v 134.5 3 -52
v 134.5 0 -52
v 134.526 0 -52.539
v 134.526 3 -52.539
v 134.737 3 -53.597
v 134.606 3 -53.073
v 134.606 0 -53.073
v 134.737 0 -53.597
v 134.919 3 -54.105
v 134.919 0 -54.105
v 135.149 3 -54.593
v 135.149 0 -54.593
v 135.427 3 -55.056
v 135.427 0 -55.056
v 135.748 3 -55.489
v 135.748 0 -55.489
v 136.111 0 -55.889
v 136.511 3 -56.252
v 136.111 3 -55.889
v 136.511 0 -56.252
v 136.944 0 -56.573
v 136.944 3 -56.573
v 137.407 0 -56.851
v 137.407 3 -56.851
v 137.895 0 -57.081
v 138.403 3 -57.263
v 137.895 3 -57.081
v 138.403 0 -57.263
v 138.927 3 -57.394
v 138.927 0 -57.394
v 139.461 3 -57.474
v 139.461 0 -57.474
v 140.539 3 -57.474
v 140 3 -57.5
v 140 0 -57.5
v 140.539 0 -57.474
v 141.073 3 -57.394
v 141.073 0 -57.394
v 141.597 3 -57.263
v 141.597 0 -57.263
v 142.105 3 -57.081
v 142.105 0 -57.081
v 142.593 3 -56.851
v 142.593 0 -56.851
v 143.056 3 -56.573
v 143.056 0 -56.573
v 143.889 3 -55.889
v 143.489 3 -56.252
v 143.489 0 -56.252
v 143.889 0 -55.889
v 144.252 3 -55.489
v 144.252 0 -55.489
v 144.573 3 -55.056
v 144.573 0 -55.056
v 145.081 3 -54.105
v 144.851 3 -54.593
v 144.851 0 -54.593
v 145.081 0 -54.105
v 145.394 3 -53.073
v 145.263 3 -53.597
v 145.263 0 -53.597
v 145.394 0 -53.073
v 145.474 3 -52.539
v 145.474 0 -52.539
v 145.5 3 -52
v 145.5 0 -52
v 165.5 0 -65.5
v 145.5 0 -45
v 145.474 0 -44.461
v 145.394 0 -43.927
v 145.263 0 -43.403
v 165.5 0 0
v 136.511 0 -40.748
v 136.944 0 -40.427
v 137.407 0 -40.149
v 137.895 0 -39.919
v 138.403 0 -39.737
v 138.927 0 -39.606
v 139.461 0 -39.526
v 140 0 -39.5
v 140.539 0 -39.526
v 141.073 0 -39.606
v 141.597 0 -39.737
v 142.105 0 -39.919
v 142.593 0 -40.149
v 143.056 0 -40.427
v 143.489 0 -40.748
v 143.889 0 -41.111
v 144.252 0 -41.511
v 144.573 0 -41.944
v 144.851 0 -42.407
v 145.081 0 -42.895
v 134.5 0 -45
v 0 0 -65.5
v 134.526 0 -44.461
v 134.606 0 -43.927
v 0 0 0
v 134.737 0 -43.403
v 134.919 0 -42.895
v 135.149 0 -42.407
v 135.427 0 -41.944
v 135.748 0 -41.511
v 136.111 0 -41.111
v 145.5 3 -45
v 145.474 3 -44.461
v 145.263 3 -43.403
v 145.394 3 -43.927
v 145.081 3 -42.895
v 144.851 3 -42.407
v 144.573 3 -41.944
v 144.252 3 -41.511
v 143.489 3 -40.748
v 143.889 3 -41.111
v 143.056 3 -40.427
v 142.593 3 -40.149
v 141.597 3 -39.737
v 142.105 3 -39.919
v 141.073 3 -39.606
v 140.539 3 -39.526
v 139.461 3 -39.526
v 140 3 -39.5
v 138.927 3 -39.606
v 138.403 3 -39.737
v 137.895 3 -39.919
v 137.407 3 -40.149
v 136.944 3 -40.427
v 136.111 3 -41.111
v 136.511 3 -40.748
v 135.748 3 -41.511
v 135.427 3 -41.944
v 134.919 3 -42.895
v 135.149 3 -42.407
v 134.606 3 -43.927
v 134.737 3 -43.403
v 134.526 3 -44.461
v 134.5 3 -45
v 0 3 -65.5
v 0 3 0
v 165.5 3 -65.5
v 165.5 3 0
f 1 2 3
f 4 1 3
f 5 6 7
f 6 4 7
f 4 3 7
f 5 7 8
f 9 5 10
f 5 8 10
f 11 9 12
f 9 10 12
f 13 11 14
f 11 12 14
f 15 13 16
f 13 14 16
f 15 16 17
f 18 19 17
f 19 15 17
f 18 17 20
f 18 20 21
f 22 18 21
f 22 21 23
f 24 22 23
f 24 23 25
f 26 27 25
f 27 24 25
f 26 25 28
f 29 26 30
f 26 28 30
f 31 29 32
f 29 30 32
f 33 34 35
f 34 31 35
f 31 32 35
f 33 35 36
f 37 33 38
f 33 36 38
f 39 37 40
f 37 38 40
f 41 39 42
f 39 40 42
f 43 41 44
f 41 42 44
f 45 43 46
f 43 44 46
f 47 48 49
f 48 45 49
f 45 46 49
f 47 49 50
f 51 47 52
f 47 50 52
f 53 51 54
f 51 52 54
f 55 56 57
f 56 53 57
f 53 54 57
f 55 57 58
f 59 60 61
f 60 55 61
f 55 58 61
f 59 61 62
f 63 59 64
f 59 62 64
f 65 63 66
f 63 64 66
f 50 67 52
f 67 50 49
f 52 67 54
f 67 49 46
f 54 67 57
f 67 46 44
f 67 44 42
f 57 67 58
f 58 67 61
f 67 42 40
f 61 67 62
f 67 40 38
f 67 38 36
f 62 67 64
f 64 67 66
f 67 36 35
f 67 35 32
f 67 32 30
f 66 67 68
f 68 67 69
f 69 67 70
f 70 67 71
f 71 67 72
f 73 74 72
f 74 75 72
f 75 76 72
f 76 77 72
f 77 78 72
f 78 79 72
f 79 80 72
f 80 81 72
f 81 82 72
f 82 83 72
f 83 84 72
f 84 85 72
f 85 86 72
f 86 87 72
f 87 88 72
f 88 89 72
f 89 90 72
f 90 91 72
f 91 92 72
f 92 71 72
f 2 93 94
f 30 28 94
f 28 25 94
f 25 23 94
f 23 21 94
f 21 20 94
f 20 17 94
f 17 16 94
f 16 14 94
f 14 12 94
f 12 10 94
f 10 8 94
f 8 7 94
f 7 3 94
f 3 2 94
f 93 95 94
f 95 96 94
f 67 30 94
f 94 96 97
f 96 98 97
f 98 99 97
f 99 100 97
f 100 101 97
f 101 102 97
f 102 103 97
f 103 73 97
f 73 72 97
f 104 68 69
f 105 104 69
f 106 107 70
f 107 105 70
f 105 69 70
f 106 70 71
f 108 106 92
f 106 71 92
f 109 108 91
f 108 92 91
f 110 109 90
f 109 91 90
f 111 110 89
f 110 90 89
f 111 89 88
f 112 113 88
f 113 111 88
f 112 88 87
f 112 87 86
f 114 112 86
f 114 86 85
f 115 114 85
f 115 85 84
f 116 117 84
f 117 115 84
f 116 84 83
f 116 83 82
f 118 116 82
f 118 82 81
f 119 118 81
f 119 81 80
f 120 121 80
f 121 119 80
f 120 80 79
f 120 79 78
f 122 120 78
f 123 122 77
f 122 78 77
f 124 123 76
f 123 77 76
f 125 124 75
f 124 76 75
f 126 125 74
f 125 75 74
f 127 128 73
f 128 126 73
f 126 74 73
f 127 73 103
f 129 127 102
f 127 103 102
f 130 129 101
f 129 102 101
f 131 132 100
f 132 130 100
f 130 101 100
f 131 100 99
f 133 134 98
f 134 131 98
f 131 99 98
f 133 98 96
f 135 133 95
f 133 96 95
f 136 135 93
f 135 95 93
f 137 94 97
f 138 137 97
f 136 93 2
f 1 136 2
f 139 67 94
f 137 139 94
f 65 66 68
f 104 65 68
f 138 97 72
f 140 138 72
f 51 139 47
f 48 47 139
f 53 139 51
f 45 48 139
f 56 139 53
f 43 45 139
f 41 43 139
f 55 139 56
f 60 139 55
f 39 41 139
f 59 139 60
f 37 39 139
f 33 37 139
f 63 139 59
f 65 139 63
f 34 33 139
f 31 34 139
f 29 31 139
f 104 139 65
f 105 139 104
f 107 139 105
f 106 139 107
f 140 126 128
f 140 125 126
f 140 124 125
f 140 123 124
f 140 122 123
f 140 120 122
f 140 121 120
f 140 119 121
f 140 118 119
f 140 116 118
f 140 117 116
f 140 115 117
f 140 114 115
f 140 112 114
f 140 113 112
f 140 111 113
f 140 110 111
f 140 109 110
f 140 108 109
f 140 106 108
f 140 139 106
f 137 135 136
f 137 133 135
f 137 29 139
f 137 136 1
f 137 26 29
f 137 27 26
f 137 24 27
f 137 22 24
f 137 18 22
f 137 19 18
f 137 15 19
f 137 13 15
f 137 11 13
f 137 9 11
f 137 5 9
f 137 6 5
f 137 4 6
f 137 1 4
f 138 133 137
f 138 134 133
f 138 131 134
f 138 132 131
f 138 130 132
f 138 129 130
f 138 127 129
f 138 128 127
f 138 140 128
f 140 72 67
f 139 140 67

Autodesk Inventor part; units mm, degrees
ref_plane "YZ Plane" through (0, 0, 0) normal (1, 0, 0) x (0, 1, 0)
ref_plane "XZ Plane" through (0, 0, 0) normal (0, 1, 0) x (-1, 0, 0)
ref_plane "XY Plane" through (0, 0, 0) normal (0, 0, 1) x (1, 0, 0)
sketch "Skizze1" plane through (0, 0, 0) normal (0, 1, 0) x (-1, 0, 0)
  line L0 (0, 0) -> (-165.5, 0)
  line L1 (-165.5, 0) -> (-165.5, -65.5)
  line L2 (-165.5, -65.5) -> (0, -65.5)
  line L3 (0, -65.5) -> (0, 0)
  line L4 (-134.5, -45) -> (-134.5, -52)
  line L5 (-145.5, -52) -> (-145.5, -45)
  arc A0 (-145.5, -52) -> (-134.5, -52) centre (-140, -52) ccw
  arc A1 (-134.5, -45) -> (-145.5, -45) centre (-140, -45) ccw
  dimension "d0" = 165.5
  dimension "d1" = 65.5
  dimension "d8" = 11
  dimension "d9" = 7
  dimension "d10" = 13.5
  dimension "d11" = 20
extrude "Extrusion1" add sketch "Skizze1" along normal blind 3
properties part number "wood_front"
